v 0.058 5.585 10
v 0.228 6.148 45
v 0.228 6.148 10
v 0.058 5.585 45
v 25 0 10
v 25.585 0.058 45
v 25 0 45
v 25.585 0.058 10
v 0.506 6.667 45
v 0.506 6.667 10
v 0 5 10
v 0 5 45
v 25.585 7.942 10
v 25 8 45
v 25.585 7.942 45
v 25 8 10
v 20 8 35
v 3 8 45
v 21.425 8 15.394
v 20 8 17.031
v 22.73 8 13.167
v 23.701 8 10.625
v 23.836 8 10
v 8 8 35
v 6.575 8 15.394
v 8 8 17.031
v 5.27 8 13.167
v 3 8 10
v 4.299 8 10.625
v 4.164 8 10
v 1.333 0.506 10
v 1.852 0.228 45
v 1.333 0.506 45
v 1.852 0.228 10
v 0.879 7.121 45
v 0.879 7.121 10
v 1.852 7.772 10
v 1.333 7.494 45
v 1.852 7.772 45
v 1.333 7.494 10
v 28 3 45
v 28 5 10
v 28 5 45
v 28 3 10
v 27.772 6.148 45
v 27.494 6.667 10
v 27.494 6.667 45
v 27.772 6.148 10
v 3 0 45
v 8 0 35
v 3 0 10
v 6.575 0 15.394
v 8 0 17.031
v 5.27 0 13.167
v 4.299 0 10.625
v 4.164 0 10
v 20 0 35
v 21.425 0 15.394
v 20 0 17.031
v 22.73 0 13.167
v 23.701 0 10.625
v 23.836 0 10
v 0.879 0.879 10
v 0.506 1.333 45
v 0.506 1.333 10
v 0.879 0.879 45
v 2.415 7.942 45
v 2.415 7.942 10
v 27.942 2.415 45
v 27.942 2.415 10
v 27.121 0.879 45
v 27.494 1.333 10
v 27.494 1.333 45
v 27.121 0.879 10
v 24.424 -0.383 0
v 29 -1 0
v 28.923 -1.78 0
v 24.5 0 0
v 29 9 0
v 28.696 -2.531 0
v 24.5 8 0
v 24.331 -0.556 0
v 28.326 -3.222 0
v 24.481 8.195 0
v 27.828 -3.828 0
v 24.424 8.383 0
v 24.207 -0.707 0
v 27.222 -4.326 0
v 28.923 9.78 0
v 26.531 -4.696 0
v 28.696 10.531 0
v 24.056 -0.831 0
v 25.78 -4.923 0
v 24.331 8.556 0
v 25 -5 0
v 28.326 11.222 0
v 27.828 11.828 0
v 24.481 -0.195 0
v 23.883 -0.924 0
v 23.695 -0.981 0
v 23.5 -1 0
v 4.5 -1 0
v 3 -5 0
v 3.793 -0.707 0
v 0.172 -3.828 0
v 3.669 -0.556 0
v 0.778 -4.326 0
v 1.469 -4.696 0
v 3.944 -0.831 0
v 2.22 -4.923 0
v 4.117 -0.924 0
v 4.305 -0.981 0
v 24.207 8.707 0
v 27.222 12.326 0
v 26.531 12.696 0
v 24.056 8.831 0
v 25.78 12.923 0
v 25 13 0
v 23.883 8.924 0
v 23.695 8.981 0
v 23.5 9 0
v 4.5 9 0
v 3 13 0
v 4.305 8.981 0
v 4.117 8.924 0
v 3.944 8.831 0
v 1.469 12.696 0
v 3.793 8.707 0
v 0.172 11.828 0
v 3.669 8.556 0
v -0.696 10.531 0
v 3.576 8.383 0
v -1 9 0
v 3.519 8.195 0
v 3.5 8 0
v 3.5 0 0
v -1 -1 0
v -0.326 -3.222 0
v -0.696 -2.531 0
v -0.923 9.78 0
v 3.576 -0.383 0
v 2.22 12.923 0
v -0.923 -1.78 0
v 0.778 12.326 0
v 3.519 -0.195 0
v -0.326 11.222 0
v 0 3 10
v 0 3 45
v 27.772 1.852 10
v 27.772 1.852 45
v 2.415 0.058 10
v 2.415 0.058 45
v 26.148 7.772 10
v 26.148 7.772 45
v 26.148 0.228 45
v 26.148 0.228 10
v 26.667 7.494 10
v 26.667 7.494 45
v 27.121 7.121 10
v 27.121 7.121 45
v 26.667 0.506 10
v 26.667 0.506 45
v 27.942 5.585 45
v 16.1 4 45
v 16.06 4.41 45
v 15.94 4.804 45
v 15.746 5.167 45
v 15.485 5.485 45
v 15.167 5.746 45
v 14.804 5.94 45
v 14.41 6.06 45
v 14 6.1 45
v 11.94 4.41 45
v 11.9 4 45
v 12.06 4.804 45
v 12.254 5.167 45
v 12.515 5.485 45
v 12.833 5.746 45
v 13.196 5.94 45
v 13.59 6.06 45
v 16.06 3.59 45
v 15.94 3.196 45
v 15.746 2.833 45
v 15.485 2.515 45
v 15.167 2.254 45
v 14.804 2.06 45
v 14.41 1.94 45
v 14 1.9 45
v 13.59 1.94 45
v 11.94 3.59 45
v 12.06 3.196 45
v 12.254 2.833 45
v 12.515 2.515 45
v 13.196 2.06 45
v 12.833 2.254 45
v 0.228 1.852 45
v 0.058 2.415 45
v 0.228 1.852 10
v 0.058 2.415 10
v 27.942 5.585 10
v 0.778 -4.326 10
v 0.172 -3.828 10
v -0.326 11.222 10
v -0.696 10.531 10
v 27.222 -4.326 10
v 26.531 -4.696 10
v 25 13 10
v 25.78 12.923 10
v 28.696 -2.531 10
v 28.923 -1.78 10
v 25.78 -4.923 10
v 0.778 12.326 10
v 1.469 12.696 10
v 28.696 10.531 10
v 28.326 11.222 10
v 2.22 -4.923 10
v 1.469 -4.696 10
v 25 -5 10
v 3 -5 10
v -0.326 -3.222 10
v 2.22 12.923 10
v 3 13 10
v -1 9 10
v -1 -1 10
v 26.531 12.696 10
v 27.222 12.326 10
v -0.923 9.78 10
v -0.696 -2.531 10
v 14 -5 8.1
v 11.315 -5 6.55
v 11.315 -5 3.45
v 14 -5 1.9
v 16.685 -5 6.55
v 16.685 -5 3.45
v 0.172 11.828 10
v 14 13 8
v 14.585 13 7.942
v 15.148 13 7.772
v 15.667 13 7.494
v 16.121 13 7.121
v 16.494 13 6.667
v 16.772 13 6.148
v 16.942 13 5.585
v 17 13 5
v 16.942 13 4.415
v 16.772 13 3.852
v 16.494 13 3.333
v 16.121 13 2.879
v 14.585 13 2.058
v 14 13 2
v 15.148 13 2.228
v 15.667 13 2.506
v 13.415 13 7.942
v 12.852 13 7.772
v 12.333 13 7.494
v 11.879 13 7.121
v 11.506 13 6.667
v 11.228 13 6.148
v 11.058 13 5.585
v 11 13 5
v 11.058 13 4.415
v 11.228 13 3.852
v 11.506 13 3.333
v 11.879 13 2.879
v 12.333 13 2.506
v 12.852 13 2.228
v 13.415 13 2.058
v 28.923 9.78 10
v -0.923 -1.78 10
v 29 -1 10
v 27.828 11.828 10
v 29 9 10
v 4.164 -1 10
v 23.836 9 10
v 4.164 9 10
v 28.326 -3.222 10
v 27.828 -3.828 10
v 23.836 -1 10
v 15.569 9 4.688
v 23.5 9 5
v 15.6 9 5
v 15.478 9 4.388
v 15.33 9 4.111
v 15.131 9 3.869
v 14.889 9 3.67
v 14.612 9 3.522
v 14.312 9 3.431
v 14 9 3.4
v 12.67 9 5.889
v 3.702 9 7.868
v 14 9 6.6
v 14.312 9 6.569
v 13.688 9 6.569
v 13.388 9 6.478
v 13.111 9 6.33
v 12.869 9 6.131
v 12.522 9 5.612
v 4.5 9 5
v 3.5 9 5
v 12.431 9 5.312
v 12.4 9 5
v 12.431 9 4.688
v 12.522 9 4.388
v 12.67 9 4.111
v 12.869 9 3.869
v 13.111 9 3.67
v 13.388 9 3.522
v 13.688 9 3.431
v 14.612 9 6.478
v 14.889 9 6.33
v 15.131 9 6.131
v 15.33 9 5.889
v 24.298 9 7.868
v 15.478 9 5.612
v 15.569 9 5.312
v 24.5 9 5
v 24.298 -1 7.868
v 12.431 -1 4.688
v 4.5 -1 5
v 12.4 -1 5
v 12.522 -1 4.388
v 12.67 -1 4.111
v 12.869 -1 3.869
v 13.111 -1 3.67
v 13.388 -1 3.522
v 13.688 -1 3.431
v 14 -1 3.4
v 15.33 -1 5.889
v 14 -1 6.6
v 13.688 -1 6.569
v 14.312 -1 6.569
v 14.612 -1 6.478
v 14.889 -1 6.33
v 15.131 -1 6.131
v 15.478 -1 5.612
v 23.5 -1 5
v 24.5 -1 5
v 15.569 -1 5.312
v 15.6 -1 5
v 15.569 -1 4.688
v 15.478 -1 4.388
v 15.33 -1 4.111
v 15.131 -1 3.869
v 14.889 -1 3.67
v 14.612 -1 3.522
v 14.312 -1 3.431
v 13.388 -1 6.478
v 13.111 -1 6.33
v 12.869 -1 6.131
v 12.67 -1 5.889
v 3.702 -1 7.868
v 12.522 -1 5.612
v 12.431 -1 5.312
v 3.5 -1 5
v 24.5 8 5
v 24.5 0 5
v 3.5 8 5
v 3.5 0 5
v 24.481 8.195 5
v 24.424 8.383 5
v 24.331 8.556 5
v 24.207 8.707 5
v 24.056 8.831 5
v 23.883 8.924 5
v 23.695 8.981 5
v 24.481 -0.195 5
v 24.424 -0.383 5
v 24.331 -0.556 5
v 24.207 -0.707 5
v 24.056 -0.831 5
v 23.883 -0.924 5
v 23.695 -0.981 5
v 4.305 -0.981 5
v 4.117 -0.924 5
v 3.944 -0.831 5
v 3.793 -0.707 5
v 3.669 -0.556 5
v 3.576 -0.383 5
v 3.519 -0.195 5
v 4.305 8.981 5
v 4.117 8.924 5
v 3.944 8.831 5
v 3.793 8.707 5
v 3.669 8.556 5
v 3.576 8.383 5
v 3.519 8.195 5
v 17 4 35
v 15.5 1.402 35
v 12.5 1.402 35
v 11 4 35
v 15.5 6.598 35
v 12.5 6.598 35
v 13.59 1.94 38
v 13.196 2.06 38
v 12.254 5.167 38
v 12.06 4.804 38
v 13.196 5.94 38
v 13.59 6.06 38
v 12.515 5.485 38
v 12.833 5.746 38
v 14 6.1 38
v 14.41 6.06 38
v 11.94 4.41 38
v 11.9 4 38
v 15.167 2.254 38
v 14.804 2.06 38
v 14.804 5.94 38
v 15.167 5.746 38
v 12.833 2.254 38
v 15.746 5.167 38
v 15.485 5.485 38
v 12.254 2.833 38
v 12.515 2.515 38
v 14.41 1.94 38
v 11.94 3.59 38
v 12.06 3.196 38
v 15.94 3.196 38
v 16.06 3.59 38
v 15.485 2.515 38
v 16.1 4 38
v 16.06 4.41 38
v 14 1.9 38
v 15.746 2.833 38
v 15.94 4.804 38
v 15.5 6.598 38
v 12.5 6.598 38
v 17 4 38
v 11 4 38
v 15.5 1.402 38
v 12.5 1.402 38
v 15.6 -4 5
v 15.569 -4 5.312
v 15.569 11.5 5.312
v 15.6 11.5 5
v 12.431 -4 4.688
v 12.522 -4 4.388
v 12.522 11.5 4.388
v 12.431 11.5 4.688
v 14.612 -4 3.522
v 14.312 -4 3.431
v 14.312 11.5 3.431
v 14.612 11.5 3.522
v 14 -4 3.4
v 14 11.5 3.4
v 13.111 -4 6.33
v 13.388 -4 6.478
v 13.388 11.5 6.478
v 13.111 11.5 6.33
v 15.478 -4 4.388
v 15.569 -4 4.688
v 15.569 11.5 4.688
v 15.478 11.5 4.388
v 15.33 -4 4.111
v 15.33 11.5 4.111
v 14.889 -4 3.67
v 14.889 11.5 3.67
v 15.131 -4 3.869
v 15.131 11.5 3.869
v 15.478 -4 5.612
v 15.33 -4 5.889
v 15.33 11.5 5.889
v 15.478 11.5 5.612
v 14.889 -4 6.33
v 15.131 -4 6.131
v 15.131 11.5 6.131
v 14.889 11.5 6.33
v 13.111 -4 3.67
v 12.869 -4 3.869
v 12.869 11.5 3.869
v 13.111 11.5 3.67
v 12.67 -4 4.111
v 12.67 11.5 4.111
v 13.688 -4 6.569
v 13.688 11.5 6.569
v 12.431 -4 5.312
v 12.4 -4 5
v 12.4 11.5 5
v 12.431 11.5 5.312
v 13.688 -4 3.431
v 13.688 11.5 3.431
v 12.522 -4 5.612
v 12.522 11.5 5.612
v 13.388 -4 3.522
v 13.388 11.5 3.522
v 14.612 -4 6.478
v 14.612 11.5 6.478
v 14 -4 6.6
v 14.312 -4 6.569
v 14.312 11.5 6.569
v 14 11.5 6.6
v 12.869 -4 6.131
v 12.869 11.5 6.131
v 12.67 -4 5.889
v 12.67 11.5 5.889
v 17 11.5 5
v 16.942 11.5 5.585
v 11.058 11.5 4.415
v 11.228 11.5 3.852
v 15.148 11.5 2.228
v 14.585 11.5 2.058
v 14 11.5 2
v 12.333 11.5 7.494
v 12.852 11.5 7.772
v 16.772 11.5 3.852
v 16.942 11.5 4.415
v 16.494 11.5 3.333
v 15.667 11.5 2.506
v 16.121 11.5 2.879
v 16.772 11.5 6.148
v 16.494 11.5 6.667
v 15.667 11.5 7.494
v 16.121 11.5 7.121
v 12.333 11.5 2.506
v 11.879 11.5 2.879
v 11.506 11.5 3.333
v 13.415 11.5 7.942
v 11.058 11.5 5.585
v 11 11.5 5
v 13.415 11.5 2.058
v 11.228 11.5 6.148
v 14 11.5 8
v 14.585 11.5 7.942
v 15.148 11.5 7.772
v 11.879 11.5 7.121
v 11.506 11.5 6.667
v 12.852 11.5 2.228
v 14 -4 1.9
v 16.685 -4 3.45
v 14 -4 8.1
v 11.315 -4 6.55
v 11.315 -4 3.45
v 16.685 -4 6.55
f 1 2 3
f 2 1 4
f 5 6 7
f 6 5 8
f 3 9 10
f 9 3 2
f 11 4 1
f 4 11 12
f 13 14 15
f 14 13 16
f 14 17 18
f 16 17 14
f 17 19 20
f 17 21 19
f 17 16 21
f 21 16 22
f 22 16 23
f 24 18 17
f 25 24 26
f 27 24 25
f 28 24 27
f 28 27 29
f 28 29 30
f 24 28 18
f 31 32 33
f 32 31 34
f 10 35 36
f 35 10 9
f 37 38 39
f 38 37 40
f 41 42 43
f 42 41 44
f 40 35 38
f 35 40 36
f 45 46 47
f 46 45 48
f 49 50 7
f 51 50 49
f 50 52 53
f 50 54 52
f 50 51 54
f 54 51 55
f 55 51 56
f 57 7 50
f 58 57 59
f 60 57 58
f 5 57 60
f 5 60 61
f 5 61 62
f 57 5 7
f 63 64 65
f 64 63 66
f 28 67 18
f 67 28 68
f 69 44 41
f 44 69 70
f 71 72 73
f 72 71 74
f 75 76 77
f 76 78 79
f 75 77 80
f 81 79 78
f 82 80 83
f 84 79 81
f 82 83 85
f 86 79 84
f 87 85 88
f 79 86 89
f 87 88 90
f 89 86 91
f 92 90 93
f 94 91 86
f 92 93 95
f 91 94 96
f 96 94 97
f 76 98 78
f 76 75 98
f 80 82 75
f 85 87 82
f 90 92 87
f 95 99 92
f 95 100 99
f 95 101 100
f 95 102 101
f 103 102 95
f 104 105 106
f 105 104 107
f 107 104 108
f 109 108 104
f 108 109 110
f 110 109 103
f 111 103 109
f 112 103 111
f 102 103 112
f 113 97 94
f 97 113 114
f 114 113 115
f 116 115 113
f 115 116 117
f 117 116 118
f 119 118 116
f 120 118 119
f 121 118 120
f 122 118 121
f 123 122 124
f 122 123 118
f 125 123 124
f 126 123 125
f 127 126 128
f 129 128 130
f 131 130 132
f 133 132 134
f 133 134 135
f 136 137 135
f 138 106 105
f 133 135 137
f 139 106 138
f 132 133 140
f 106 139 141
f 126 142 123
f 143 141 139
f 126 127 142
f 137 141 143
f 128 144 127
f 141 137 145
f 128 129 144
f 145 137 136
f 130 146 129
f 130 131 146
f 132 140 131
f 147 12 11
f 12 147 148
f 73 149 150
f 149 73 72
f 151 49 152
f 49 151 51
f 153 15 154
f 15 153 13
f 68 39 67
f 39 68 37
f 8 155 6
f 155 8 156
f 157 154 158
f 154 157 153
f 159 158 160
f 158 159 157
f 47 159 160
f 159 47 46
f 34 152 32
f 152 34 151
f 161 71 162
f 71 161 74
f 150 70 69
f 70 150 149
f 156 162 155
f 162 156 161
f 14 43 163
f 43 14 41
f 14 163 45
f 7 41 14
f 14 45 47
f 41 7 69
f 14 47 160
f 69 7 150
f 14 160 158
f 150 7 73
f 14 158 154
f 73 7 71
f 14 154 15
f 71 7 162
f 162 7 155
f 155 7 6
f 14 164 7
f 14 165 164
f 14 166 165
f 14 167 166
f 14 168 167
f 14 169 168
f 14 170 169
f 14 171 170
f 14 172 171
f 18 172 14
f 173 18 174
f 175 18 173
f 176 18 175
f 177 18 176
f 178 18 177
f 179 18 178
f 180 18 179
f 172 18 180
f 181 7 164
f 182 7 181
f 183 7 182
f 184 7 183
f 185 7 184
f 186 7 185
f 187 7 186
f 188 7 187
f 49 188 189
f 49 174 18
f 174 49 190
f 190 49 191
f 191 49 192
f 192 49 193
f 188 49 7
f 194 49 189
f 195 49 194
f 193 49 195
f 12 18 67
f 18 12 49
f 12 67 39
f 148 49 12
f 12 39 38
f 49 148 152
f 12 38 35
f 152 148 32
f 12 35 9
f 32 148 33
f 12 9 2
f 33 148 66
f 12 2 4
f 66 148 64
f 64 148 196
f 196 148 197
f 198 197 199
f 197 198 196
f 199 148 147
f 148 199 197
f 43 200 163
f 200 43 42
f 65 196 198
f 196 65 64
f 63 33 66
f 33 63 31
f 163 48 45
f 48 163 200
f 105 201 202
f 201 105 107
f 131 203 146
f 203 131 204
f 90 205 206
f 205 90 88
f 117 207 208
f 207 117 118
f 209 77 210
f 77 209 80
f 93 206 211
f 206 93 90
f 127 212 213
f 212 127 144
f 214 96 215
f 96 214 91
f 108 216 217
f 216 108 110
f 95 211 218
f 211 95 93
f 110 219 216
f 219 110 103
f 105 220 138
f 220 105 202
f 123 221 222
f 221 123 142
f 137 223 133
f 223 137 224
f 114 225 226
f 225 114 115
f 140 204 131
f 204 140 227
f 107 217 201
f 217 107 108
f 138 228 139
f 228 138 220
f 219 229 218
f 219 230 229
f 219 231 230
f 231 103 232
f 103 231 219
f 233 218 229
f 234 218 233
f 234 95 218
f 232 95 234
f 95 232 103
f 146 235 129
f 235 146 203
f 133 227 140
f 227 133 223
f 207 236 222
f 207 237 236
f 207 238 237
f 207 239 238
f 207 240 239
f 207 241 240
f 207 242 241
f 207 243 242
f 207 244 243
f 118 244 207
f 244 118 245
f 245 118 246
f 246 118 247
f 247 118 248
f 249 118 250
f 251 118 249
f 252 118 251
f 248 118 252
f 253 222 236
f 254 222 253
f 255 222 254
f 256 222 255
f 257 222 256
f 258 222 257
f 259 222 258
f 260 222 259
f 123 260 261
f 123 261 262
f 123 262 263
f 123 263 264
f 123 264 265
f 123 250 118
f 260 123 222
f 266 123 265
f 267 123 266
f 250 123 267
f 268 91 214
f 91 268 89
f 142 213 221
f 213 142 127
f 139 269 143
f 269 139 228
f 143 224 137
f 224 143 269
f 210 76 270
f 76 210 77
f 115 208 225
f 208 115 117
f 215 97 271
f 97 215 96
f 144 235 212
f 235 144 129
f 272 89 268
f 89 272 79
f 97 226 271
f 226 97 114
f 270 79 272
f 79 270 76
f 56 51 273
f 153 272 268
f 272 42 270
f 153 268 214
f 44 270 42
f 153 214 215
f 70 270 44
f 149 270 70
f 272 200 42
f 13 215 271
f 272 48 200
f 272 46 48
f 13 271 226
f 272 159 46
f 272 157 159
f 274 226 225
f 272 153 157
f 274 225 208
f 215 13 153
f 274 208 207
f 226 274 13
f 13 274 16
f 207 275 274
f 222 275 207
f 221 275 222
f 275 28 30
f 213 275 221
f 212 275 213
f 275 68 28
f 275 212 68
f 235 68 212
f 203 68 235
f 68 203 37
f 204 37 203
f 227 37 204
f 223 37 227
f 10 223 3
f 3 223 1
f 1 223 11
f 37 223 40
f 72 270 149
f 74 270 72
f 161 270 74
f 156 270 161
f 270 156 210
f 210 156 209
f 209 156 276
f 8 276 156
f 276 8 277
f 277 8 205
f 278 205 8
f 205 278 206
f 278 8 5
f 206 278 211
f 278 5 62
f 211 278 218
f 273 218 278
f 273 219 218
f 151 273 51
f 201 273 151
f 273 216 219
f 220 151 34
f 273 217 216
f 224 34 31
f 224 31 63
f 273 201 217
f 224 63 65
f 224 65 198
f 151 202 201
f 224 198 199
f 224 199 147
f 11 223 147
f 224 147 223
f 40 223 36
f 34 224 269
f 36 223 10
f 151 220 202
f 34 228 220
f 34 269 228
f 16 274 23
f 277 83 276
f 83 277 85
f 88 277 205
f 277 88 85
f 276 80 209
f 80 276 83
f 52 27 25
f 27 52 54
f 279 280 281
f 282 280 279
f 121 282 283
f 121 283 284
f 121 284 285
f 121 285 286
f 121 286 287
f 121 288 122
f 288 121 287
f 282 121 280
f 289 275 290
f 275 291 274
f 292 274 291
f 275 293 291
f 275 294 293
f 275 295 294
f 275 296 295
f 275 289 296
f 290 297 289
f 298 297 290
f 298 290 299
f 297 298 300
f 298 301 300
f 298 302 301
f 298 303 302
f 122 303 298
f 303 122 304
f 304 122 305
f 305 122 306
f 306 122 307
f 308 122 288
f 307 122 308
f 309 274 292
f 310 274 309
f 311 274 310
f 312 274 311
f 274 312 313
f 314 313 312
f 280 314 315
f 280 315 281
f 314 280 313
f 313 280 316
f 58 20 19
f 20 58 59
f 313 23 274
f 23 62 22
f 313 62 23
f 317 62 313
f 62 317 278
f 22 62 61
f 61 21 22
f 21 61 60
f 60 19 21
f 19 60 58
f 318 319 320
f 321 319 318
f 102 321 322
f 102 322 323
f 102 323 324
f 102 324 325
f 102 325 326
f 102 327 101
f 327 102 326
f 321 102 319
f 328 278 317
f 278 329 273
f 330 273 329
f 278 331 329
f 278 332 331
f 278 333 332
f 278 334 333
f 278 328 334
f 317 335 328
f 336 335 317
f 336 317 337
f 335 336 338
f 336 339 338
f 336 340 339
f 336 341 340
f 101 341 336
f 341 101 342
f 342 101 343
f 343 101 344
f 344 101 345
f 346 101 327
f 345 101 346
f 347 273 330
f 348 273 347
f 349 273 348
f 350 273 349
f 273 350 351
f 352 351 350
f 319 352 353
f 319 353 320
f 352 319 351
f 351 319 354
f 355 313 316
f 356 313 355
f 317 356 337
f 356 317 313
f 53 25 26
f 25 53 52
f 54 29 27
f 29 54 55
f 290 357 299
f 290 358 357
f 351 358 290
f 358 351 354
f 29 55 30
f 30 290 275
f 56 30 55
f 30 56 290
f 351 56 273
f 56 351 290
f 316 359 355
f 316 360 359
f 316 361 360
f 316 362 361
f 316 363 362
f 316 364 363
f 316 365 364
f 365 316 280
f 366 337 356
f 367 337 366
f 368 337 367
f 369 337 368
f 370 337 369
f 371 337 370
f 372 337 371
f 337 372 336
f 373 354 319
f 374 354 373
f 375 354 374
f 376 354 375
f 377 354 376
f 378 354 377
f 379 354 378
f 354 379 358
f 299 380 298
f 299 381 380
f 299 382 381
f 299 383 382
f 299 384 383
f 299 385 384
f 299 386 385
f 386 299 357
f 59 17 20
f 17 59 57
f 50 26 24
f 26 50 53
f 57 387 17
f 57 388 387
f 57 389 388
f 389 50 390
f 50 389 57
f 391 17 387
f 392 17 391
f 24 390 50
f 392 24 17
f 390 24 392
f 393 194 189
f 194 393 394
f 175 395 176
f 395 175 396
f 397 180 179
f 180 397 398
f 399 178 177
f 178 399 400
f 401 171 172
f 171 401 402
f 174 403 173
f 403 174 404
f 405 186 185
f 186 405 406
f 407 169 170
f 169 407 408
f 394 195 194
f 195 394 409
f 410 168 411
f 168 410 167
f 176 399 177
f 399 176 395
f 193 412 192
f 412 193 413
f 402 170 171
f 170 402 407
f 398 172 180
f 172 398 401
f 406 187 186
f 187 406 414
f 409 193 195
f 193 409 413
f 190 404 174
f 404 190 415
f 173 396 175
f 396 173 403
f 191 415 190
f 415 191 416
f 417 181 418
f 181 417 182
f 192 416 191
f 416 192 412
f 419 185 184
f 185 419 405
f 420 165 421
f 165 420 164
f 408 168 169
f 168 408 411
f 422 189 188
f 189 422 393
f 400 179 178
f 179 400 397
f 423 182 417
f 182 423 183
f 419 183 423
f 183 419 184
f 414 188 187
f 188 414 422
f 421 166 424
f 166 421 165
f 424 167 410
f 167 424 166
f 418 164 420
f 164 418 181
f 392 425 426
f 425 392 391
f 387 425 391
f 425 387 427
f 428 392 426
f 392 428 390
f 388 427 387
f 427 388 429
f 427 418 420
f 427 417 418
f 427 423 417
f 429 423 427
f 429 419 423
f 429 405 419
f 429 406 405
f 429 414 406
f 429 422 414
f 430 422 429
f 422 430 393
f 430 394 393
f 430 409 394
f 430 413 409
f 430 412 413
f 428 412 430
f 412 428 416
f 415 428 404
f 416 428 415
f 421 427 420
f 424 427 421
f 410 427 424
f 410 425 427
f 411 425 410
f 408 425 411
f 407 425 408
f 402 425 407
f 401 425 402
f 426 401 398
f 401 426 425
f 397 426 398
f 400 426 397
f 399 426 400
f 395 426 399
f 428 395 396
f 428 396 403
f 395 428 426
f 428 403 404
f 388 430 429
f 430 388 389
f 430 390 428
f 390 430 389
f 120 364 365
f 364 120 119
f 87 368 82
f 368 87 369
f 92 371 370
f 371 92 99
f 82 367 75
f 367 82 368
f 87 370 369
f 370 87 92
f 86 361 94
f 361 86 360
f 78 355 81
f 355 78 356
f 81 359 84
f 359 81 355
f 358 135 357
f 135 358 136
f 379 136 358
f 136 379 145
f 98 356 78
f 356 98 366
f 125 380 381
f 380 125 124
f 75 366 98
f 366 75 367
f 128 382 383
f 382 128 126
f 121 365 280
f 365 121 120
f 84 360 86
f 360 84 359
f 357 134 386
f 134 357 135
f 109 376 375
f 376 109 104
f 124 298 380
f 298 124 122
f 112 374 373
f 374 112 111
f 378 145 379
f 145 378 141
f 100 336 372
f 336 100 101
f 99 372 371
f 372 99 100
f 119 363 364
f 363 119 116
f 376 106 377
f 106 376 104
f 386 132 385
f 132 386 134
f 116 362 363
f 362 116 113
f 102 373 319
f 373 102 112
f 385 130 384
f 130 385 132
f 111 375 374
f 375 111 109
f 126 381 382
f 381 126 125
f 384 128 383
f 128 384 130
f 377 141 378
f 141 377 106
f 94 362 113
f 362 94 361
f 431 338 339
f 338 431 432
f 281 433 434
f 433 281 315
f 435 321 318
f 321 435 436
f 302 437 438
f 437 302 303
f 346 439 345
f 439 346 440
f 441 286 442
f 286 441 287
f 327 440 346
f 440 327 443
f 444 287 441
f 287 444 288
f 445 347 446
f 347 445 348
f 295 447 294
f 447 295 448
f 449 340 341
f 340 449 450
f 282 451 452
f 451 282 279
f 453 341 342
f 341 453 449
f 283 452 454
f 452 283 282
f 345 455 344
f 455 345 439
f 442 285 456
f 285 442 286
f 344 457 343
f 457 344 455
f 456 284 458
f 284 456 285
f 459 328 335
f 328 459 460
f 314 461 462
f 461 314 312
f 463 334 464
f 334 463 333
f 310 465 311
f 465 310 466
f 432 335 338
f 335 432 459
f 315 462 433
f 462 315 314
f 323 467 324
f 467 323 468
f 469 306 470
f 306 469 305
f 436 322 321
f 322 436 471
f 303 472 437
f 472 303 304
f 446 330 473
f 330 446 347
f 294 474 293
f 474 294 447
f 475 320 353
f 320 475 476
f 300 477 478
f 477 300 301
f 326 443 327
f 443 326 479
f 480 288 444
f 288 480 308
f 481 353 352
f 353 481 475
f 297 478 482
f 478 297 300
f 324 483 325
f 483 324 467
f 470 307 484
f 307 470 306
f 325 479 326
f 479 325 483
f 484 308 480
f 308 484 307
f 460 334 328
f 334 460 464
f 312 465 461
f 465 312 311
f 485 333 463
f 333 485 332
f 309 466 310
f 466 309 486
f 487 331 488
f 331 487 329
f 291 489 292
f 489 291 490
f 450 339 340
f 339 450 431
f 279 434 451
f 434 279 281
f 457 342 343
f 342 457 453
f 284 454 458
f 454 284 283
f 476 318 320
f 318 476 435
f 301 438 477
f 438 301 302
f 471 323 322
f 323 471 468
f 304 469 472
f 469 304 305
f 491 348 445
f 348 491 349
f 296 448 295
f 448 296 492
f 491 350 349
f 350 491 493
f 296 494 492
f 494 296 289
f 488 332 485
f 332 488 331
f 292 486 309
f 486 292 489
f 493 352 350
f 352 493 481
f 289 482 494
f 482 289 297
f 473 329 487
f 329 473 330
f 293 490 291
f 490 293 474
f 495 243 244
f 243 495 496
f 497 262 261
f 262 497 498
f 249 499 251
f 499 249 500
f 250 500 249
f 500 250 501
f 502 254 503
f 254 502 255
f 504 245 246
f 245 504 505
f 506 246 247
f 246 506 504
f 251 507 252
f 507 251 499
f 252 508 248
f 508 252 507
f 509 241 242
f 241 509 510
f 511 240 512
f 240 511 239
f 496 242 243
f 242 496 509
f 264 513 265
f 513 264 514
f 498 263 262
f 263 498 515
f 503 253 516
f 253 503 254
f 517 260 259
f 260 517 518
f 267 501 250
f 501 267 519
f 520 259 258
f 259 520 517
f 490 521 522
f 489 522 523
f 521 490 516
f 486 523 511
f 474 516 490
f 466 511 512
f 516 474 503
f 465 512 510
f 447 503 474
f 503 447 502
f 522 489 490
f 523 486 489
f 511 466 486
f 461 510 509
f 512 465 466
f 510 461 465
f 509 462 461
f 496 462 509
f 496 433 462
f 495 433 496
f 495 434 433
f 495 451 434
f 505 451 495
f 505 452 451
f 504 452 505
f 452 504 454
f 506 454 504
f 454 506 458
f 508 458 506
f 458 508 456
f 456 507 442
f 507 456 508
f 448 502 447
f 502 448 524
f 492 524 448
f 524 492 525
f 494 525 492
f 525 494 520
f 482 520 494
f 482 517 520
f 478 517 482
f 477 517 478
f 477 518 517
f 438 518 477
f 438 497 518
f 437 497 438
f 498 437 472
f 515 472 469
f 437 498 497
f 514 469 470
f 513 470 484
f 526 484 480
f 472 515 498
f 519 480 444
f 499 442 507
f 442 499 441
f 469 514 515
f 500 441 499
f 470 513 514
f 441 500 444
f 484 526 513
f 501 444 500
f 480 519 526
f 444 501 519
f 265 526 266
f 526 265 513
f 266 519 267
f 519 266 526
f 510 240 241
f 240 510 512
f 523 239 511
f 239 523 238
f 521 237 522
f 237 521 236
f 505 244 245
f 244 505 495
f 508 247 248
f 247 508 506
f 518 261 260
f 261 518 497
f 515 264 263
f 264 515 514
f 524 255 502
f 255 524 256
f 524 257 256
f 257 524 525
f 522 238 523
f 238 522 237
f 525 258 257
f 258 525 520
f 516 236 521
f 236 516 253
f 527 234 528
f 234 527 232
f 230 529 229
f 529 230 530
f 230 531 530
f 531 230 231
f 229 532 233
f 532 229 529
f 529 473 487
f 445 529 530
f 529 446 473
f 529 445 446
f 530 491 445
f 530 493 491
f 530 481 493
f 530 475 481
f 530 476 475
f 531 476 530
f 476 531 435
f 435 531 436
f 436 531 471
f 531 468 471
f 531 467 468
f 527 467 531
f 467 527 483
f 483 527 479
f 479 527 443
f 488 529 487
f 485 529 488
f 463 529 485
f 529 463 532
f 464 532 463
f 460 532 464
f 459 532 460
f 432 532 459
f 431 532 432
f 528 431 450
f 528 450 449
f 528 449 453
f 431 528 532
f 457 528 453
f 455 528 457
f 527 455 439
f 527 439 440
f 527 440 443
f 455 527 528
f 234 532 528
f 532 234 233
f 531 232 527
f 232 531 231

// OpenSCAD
$fn=32;

translate([0,0,45]) rotate(a=90, v=[0,1,0]) {
    difference() {
        mainBody(45,8,28);
        mainSubtractions(45,8,28);
    }
}

module cubeWithXHorizontalFillets(length, width, height, radius, center) {
    diameter = radius * 2;
    translate([0, radius/2, radius/2]) {
        minkowski() {
            cube([length/2, width-radius, height-radius]);
            rotate(a=90,v=[0,1,0]) cylinder(r=radius/2,h=length/2);
        } 
    }
}

module mainBody(length, width, height) {
    cubeWithXHorizontalFillets(length,width,height,6);
    translate([length-10,-5,-1]) cubeWithXHorizontalFillets(10,18,30,8);
}

module mainSubtractions(length, width, height) {
    offsetValue = length - 5;
    translate([10,0,8]) cube([35,8,12]);
    translate([0,4,14]) rotate(a=90,v=[0,1,0]) cylinder(h=10,r=2.1);
    translate([7,4,14]) rotate(a=90,v=[0,1,0]) cylinder($fn=6, h=3,r=3);
    translate([offsetValue,9,14]) scale([1.4,1,1]) rotate(a=90,v=[1,0,0]) halfCylinder(10,10.5);
    translate([offsetValue,-1,3.5]) cubeWithXHorizontalFillets(10,10,21,2);
    
    // Pully Hole
    translate([offsetValue,13,14]) rotate(a=90, v=[1,0,0]) cylinder(h=18,r=1.6);
    translate([offsetValue,13,14]) rotate(a=90, v=[1,0,0]) cylinder(h=1.5,r=3);
    translate([offsetValue,-4,14]) rotate(a=90, v=[1,0,0]) cylinder($fn=6, h=1.5,r=3.1);
}

module halfCylinder(height, radius) {
    difference() {
        cylinder(h=height,r=radius);
        translate([0,-radius,0]) cube([radius, radius*2, height]);
    }
}
